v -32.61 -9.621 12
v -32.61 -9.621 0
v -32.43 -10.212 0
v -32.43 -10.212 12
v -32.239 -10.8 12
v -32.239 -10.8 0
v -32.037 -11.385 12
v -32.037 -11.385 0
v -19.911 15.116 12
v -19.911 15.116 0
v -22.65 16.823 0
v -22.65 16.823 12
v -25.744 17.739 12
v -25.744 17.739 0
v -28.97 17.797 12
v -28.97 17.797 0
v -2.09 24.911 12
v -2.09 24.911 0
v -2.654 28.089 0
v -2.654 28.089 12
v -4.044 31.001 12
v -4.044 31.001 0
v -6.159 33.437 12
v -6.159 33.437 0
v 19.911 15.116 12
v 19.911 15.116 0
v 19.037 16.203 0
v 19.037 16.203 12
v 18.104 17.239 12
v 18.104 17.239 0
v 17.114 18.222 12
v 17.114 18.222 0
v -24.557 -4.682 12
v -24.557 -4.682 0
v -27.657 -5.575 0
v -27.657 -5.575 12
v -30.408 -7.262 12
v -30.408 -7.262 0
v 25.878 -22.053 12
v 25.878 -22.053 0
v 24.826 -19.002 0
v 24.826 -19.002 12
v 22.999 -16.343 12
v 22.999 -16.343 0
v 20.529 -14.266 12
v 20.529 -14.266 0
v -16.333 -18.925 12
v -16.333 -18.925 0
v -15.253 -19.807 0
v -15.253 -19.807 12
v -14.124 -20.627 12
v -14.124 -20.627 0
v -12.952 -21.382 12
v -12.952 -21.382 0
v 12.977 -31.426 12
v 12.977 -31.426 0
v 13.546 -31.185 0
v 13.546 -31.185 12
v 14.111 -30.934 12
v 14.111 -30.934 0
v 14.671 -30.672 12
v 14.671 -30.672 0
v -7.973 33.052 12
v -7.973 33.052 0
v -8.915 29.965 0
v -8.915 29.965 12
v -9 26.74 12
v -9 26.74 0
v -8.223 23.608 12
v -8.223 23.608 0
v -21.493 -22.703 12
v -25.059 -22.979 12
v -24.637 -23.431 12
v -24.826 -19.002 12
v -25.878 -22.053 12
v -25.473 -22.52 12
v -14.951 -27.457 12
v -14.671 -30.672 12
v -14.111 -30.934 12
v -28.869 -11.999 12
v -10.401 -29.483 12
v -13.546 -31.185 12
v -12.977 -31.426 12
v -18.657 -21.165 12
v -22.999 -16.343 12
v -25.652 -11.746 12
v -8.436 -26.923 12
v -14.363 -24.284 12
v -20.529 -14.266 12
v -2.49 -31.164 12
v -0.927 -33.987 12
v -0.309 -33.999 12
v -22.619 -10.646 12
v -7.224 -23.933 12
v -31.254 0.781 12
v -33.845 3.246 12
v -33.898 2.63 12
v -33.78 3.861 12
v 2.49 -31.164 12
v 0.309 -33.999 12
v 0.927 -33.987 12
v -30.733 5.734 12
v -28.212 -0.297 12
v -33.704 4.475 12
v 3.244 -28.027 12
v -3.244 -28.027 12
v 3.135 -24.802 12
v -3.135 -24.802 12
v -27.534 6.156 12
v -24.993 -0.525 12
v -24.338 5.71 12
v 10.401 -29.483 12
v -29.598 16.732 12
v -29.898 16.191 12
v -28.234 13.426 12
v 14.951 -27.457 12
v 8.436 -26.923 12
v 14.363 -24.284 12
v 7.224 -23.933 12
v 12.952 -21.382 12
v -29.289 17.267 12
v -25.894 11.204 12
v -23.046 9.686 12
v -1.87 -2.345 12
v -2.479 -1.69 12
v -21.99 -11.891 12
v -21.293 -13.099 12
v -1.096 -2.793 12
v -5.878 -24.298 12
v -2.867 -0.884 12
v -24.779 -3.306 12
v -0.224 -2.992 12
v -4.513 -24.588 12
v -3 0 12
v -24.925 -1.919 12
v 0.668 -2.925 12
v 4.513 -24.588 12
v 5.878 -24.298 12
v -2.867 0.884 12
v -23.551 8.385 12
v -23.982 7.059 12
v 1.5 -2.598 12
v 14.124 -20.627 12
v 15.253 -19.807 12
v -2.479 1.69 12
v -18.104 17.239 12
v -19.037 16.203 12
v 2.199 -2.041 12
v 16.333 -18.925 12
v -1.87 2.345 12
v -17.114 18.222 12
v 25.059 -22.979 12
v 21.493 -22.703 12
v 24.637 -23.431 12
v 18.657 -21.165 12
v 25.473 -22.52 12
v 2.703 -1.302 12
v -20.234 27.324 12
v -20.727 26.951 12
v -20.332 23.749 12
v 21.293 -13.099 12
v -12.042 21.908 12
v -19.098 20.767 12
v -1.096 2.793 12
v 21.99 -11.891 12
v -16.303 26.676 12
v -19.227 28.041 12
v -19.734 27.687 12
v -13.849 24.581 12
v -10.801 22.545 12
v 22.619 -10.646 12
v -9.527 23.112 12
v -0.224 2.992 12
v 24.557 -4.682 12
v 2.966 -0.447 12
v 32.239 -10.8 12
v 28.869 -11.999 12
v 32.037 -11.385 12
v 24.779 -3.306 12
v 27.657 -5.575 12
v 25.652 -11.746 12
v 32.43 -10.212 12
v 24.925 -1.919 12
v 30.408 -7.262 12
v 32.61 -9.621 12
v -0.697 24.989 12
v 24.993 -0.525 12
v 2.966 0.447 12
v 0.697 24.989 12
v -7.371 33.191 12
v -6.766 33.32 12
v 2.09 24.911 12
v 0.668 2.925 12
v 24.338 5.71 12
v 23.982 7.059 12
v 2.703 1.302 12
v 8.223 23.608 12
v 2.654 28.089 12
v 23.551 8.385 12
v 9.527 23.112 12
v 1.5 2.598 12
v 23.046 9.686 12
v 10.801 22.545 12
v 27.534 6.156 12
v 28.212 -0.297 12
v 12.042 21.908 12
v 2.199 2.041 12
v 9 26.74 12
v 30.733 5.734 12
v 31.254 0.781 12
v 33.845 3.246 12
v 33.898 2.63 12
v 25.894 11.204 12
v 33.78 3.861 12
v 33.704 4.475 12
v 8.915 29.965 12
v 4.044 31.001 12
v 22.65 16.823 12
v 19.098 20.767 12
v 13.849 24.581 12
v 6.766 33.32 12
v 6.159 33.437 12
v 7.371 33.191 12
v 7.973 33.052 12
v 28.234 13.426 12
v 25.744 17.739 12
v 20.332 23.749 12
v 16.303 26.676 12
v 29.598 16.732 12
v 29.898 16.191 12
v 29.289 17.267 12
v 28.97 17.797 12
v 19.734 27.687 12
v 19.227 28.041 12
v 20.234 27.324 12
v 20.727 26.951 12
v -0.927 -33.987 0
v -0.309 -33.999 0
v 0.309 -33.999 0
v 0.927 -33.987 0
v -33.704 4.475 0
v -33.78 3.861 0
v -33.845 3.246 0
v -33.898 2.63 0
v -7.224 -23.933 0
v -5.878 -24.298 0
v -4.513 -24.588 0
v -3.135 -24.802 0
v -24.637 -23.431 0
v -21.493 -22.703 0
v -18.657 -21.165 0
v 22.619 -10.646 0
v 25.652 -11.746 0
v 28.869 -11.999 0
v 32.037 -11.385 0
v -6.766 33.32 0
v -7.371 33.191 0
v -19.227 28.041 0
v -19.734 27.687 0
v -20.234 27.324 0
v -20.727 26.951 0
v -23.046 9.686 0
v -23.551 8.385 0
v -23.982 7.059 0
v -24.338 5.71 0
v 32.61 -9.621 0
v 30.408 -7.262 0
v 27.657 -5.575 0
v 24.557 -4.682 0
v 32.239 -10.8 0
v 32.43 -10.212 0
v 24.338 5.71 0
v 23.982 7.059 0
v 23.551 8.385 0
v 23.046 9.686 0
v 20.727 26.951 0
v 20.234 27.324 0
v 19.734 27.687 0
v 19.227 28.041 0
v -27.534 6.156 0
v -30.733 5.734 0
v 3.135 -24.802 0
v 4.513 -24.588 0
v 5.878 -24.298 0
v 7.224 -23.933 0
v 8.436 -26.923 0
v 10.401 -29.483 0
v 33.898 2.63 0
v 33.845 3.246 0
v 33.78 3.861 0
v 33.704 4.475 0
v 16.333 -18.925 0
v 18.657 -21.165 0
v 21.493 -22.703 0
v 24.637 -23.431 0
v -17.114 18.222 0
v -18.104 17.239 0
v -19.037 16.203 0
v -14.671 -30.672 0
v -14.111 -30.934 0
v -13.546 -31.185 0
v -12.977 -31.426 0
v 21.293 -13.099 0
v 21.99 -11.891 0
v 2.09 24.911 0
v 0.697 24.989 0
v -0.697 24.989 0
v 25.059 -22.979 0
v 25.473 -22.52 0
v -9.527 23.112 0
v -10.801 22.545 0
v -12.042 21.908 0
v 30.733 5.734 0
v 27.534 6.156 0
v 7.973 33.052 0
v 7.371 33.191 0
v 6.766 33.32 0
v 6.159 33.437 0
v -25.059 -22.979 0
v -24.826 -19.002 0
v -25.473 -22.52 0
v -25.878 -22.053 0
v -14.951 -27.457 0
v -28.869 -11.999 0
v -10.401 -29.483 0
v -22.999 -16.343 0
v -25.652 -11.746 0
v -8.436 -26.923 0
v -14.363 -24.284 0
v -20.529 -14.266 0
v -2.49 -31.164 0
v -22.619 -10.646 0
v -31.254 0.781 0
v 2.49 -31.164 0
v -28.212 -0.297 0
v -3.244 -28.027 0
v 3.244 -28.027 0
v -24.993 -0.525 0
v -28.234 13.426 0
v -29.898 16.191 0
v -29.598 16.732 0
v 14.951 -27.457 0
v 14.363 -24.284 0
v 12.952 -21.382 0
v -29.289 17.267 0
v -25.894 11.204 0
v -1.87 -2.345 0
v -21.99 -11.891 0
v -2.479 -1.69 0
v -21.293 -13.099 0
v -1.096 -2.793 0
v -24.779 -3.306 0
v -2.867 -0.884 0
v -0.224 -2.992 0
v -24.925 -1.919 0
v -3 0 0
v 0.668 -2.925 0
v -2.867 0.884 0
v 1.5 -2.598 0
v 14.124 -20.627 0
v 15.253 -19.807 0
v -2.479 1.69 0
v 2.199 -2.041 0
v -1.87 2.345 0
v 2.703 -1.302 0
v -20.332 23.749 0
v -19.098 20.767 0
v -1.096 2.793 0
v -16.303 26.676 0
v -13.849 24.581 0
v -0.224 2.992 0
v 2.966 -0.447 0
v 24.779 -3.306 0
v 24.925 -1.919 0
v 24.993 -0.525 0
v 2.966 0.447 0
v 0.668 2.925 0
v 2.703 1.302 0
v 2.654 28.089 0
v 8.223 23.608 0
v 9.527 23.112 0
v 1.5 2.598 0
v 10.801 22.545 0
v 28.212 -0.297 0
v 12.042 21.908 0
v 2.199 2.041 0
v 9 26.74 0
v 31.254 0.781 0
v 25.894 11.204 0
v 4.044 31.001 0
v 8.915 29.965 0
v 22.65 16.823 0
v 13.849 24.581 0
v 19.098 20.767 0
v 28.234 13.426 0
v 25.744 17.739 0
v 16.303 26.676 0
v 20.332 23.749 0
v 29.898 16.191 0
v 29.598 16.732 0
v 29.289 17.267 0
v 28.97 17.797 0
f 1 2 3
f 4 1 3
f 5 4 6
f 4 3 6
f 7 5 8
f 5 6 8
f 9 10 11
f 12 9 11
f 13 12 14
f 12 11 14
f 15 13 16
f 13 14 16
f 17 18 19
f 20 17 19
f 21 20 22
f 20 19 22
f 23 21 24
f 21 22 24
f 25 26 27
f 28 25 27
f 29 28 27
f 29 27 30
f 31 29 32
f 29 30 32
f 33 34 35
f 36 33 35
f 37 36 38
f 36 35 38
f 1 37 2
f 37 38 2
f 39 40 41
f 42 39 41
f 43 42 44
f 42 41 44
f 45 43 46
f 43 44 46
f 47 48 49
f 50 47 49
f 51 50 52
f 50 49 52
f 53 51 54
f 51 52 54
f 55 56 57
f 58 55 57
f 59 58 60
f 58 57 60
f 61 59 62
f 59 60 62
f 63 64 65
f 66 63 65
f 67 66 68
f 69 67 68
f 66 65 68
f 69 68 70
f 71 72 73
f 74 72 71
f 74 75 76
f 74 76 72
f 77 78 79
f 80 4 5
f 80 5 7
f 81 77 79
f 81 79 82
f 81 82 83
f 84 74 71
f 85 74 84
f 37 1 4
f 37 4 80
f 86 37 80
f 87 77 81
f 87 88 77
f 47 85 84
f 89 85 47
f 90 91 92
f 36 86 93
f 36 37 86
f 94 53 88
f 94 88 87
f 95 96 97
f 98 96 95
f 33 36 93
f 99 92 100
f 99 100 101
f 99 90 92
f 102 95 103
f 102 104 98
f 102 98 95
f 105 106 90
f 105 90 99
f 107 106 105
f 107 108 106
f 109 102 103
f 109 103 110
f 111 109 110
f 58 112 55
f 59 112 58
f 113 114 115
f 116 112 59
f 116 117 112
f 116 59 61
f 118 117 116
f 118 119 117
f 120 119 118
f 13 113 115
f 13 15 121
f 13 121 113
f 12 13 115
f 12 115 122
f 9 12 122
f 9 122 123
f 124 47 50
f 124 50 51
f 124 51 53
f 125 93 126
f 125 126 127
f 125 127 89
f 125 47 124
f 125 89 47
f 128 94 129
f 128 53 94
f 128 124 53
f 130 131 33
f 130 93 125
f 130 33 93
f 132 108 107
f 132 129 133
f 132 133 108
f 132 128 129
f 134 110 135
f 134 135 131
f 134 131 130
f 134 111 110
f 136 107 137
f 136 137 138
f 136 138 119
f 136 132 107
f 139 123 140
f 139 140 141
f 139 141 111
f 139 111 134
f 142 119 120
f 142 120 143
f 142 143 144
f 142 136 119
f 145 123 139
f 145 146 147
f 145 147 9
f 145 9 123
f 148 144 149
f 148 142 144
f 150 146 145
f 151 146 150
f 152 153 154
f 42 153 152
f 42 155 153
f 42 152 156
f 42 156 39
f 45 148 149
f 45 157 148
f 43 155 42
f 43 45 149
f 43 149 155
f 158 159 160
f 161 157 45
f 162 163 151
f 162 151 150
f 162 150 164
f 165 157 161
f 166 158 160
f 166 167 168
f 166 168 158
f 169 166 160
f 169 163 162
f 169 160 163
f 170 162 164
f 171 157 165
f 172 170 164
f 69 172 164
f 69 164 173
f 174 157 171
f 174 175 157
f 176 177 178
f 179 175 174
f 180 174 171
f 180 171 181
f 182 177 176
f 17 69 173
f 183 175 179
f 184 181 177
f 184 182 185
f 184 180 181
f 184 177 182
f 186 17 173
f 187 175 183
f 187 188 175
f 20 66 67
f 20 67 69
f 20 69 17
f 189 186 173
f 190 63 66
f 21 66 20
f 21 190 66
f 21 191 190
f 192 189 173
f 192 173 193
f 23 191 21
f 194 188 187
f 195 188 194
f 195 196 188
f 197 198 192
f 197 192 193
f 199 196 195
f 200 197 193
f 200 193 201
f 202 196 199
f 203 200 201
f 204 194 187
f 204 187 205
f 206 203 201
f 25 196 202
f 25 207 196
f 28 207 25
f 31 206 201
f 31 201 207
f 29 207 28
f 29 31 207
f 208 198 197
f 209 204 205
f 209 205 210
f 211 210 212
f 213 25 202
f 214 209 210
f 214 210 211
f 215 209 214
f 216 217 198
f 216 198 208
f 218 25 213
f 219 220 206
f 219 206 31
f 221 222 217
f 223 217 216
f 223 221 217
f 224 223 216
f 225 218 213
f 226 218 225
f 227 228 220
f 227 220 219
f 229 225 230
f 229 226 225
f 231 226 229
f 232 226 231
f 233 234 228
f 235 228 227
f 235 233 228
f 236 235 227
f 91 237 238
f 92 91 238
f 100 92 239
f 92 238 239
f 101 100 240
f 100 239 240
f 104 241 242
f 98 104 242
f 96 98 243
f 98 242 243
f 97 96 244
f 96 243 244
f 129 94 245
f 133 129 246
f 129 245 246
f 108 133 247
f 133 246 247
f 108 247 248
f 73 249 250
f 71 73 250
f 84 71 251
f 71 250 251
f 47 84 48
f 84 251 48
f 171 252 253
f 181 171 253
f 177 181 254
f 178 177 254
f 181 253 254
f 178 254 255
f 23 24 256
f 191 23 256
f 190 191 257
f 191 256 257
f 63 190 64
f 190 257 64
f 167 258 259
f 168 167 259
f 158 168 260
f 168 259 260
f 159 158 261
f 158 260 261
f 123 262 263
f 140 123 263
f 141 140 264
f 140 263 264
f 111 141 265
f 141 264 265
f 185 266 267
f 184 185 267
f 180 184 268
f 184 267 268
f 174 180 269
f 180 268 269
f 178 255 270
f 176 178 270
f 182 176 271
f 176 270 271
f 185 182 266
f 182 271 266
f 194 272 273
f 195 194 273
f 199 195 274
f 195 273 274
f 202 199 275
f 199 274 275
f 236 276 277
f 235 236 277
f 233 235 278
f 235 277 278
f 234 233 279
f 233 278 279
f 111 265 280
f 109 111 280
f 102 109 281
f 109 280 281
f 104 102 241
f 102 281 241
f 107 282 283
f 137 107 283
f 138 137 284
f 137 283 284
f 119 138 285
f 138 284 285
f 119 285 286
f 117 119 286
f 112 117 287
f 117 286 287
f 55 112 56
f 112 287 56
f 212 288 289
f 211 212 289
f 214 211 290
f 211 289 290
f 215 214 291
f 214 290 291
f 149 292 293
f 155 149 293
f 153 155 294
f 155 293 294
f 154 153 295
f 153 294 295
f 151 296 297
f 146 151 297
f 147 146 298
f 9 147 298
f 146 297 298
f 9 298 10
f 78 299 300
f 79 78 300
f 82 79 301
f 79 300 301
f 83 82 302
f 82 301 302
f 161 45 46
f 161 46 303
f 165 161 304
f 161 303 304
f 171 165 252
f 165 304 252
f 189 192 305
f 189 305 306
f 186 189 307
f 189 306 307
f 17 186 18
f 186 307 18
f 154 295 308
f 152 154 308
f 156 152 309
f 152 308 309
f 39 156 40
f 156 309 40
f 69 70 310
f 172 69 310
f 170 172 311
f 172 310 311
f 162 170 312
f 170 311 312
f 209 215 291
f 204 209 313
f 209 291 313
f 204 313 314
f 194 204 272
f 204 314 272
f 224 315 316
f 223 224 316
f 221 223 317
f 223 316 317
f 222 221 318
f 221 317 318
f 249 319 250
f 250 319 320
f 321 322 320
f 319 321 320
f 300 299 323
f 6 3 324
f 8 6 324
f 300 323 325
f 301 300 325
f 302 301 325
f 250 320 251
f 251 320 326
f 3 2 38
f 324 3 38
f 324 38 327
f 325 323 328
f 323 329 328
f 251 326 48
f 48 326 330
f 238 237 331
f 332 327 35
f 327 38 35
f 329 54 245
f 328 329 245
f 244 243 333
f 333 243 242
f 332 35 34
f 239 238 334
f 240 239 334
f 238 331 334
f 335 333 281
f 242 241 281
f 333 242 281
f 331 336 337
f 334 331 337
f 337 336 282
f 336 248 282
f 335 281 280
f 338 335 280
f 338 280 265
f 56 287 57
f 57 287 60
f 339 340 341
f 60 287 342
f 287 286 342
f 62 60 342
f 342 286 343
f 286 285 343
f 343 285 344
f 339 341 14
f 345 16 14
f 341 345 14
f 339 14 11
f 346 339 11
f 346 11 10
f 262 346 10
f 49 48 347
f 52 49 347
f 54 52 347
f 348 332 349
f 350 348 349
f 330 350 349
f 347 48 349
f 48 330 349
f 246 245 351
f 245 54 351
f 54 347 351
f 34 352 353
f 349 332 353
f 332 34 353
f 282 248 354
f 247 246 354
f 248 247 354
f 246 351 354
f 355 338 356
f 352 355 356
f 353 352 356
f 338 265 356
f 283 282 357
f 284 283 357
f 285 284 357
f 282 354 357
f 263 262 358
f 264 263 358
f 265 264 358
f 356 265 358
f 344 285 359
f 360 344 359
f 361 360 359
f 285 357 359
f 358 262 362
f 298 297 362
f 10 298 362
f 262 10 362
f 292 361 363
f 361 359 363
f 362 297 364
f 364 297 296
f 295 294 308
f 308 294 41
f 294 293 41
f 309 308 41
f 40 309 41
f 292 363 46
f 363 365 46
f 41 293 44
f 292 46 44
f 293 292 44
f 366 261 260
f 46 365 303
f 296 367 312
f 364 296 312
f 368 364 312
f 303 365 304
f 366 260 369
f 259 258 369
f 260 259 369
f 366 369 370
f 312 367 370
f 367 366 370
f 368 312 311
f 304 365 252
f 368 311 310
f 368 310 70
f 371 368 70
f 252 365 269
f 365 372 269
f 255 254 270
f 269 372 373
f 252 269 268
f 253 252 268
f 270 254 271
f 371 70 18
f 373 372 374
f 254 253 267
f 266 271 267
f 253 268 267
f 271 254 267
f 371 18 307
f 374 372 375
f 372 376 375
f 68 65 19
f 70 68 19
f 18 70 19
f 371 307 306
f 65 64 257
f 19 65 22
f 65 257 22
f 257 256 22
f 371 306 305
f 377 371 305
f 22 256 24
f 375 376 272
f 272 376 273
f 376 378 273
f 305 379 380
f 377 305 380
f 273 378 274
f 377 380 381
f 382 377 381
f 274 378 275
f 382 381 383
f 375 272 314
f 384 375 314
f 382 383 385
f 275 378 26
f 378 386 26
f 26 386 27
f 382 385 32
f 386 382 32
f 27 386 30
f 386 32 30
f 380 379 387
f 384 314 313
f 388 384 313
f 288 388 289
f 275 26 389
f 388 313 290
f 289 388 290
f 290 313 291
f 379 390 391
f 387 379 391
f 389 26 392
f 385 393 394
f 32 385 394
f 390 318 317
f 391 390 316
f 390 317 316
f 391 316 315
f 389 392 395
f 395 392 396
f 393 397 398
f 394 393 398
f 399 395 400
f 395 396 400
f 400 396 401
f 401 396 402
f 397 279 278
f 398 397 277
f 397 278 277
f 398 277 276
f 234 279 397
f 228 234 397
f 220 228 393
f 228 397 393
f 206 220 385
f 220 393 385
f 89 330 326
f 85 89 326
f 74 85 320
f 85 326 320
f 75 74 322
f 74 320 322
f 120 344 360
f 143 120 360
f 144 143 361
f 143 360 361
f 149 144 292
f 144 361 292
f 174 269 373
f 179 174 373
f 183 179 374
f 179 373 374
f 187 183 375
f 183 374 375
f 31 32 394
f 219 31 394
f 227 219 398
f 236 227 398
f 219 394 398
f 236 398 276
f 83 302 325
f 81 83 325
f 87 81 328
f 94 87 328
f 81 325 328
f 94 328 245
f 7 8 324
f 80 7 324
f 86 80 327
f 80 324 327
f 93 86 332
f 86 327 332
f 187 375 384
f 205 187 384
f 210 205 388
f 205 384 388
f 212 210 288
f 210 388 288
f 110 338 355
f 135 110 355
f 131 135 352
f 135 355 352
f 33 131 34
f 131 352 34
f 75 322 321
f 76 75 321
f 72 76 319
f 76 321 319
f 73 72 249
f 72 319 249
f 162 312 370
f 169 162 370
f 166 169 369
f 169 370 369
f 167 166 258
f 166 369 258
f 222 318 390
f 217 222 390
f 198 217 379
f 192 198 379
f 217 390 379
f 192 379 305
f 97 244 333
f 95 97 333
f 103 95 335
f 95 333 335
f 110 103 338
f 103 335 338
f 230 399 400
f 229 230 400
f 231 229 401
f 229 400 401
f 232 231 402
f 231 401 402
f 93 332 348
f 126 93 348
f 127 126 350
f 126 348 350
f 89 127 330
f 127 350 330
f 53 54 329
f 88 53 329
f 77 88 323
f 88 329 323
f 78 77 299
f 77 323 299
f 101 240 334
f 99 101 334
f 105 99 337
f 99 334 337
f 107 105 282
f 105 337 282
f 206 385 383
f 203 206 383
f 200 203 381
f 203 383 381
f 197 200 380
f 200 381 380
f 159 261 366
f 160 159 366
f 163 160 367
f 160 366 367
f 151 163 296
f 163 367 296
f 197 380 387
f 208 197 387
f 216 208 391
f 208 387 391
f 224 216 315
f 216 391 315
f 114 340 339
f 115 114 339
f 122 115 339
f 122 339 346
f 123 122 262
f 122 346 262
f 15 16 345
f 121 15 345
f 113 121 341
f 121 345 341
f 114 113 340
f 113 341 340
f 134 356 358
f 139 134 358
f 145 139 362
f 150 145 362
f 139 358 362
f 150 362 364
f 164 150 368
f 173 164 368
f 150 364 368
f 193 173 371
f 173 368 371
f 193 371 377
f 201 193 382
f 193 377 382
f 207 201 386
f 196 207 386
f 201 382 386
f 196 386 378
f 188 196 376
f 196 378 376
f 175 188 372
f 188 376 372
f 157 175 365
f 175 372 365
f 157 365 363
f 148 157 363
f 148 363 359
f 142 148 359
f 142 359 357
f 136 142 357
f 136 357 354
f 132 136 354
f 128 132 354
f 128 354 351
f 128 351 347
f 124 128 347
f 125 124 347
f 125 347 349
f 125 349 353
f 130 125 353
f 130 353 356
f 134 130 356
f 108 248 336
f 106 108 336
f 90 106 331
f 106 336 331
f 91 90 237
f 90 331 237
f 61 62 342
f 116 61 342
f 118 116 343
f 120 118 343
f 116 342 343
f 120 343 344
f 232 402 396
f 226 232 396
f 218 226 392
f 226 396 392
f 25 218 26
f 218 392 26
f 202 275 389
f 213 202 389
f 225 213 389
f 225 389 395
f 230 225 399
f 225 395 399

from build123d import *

# Parameters (mm, degrees)
DODANIE_WYCI_GNI_CIE1_DEPTH = 12
OTW_R_6_0_6_1_D             = 6


with BuildPart() as part:
    # Szkic1 → Dodanie-wyciągnięcie1 (new body)
    with BuildSketch(Plane.XY):
        with BuildLine():
            ThreePointArc((-33.898094839, 2.630430818), (-29.769421597, 0.139315972), (-24.993476702, -0.525474417))
            ThreePointArc((-24.993476702, -0.525474417), (-24.862052862, -2.613107053), (-24.556561544, -4.68244446))
            ThreePointArc((-24.556561544, -4.68244446), (-29.089922891, -6.325682363), (-32.610442817, -9.620759807))
            ThreePointArc((-32.610442817, -9.620759807), (-32.335921554, -10.506577809), (-32.037343164, -11.384579176))
            ThreePointArc((-32.037343164, -11.384579176), (-27.252384788, -11.981043133), (-22.618947411, -10.645807579))
            ThreePointArc((-22.618947411, -10.645807579), (-21.649769069, -12.4995), (-20.529013513, -14.265679275))
            ThreePointArc((-20.529013513, -14.265679275), (-24.002080111, -17.610735974), (-25.87800636, -22.052863461))
            ThreePointArc((-25.87800636, -22.052863461), (-25.266924066, -22.750440616), (-24.637043805, -23.431092005))
            ThreePointArc((-24.637043805, -23.431092005), (-20.023163068, -22.029771036), (-16.333396627, -18.925383897))
            ThreePointArc((-16.333396627, -18.925383897), (-14.694043522, -20.224615842), (-12.951812545, -21.382248544))
            ThreePointArc((-12.951812545, -21.382248544), (-14.764059627, -25.850733346), (-14.671027508, -30.671826679))
            ThreePointArc((-14.671027508, -30.671826679), (-13.829045865, -31.06054556), (-12.976775752, -31.426156161))
            ThreePointArc((-12.976775752, -31.426156161), (-9.33175455, -28.269351393), (-7.223653181, -23.932589407))
            ThreePointArc((-7.223653181, -23.932589407), (-5.197584359, -24.452711871), (-3.135125524, -24.801632788))
            ThreePointArc((-3.135125524, -24.801632788), (-2.973199107, -29.620904076), (-0.927294719, -33.98735242))
            ThreePointArc((-0.927294719, -33.98735242), (0, -34), (0.927294719, -33.98735242))
            ThreePointArc((0.927294719, -33.98735242), (2.973199107, -29.620904076), (3.135125524, -24.801632788))
            ThreePointArc((3.135125524, -24.801632788), (5.197584359, -24.452711871), (7.223653181, -23.932589407))
            ThreePointArc((7.223653181, -23.932589407), (9.33175455, -28.269351393), (12.976775752, -31.426156161))
            ThreePointArc((12.976775752, -31.426156161), (13.829045865, -31.06054556), (14.671027508, -30.671826679))
            ThreePointArc((14.671027508, -30.671826679), (14.764059627, -25.850733346), (12.951812545, -21.382248544))
            ThreePointArc((12.951812545, -21.382248544), (14.694043522, -20.224615842), (16.333396627, -18.925383897))
            ThreePointArc((16.333396627, -18.925383897), (20.023163068, -22.029771036), (24.637043805, -23.431092005))
            ThreePointArc((24.637043805, -23.431092005), (25.266924066, -22.750440616), (25.87800636, -22.052863461))
            ThreePointArc((25.87800636, -22.052863461), (24.002080111, -17.610735974), (20.529013513, -14.265679275))
            ThreePointArc((20.529013513, -14.265679275), (21.649769069, -12.4995), (22.618947411, -10.645807579))
            ThreePointArc((22.618947411, -10.645807579), (27.252384788, -11.981043133), (32.037343164, -11.384579176))
            ThreePointArc((32.037343164, -11.384579176), (32.335921554, -10.506577809), (32.610442817, -9.620759807))
            ThreePointArc((32.610442817, -9.620759807), (29.089922891, -6.325682363), (24.556561544, -4.68244446))
            ThreePointArc((24.556561544, -4.68244446), (24.862052862, -2.613107053), (24.993476702, -0.525474417))
            ThreePointArc((24.993476702, -0.525474417), (29.769421597, 0.139315972), (33.898094839, 2.630430818))
            ThreePointArc((33.898094839, 2.630430818), (33.813744443, 3.553967751), (33.704237455, 4.47486062))
            ThreePointArc((33.704237455, 4.47486062), (29.14785373, 6.053139195), (24.338056995, 5.71042754))
            ThreePointArc((24.338056995, 5.71042754), (23.775461851, 7.725115842), (23.046406812, 9.685718046))
            ThreePointArc((23.046406812, 9.685718046), (27.139054966, 12.235586081), (29.897557962, 16.190615427))
            ThreePointArc((29.897557962, 16.190615427), (29.444863729, 17), (28.970263244, 17.796736993))
            ThreePointArc((28.970263244, 17.796736993), (24.165855859, 17.385317995), (19.911281288, 15.115914742))
            ThreePointArc((19.911281288, 15.115914742), (18.577877492, 16.727596028), (17.114403814, 18.222161866))
            ThreePointArc((17.114403814, 18.222161866), (19.81609918, 22.216212199), (20.727461703, 26.951295541))
            ThreePointArc((20.727461703, 26.951295541), (19.984698578, 27.506577809), (19.227067331, 28.041395862))
            ThreePointArc((19.227067331, 28.041395862), (15.00536197, 25.711417373), (12.041664157, 21.907722961))
            ThreePointArc((12.041664157, 21.907722961), (10.16800934, 22.837722896), (8.223164918, 23.607828357))
            ThreePointArc((8.223164918, 23.607828357), (9.066759823, 28.3554534), (7.973399012, 33.051851812))
            ThreePointArc((7.973399012, 33.051851812), (7.068997488, 33.257018425), (6.159336804, 33.437442638))
            ThreePointArc((6.159336804, 33.437442638), (3.250304677, 29.591779107), (2.089933898, 24.911486854))
            ThreePointArc((2.089933898, 24.911486854), (0, 24.999), (-2.089933898, 24.911486854))
            ThreePointArc((-2.089933898, 24.911486854), (-3.250304677, 29.591779107), (-6.159336804, 33.437442638))
            ThreePointArc((-6.159336804, 33.437442638), (-7.068997488, 33.257018425), (-7.973399012, 33.051851812))
            ThreePointArc((-7.973399012, 33.051851812), (-9.066759823, 28.3554534), (-8.223164918, 23.607828357))
            ThreePointArc((-8.223164918, 23.607828357), (-10.16800934, 22.837722896), (-12.041664157, 21.907722961))
            ThreePointArc((-12.041664157, 21.907722961), (-15.00536197, 25.711417373), (-19.227067331, 28.041395862))
            ThreePointArc((-19.227067331, 28.041395862), (-19.984698578, 27.506577809), (-20.727461703, 26.951295541))
            ThreePointArc((-20.727461703, 26.951295541), (-19.81609918, 22.216212199), (-17.114403814, 18.222161866))
            ThreePointArc((-17.114403814, 18.222161866), (-18.577877492, 16.727596028), (-19.911281288, 15.115914742))
            ThreePointArc((-19.911281288, 15.115914742), (-24.165855859, 17.385317995), (-28.970263244, 17.796736993))
            ThreePointArc((-28.970263244, 17.796736993), (-29.444863729, 17), (-29.897557962, 16.190615427))
            ThreePointArc((-29.897557962, 16.190615427), (-27.139054966, 12.235586081), (-23.046406812, 9.685718046))
            ThreePointArc((-23.046406812, 9.685718046), (-23.775461851, 7.725115842), (-24.338056995, 5.71042754))
            ThreePointArc((-24.338056995, 5.71042754), (-29.14785373, 6.053139195), (-33.704237455, 4.47486062))
            ThreePointArc((-33.704237455, 4.47486062), (-33.813744443, 3.553967751), (-33.898094839, 2.630430818))
        make_face()
    extrude(amount=DODANIE_WYCI_GNI_CIE1_DEPTH)

    # Otwór Ø6.0 (6)1 (through all)
    with Locations(Plane.XY.offset(12)):
        with Locations((0, 0)):
            Hole(OTW_R_6_0_6_1_D / 2)


solid = part.part
